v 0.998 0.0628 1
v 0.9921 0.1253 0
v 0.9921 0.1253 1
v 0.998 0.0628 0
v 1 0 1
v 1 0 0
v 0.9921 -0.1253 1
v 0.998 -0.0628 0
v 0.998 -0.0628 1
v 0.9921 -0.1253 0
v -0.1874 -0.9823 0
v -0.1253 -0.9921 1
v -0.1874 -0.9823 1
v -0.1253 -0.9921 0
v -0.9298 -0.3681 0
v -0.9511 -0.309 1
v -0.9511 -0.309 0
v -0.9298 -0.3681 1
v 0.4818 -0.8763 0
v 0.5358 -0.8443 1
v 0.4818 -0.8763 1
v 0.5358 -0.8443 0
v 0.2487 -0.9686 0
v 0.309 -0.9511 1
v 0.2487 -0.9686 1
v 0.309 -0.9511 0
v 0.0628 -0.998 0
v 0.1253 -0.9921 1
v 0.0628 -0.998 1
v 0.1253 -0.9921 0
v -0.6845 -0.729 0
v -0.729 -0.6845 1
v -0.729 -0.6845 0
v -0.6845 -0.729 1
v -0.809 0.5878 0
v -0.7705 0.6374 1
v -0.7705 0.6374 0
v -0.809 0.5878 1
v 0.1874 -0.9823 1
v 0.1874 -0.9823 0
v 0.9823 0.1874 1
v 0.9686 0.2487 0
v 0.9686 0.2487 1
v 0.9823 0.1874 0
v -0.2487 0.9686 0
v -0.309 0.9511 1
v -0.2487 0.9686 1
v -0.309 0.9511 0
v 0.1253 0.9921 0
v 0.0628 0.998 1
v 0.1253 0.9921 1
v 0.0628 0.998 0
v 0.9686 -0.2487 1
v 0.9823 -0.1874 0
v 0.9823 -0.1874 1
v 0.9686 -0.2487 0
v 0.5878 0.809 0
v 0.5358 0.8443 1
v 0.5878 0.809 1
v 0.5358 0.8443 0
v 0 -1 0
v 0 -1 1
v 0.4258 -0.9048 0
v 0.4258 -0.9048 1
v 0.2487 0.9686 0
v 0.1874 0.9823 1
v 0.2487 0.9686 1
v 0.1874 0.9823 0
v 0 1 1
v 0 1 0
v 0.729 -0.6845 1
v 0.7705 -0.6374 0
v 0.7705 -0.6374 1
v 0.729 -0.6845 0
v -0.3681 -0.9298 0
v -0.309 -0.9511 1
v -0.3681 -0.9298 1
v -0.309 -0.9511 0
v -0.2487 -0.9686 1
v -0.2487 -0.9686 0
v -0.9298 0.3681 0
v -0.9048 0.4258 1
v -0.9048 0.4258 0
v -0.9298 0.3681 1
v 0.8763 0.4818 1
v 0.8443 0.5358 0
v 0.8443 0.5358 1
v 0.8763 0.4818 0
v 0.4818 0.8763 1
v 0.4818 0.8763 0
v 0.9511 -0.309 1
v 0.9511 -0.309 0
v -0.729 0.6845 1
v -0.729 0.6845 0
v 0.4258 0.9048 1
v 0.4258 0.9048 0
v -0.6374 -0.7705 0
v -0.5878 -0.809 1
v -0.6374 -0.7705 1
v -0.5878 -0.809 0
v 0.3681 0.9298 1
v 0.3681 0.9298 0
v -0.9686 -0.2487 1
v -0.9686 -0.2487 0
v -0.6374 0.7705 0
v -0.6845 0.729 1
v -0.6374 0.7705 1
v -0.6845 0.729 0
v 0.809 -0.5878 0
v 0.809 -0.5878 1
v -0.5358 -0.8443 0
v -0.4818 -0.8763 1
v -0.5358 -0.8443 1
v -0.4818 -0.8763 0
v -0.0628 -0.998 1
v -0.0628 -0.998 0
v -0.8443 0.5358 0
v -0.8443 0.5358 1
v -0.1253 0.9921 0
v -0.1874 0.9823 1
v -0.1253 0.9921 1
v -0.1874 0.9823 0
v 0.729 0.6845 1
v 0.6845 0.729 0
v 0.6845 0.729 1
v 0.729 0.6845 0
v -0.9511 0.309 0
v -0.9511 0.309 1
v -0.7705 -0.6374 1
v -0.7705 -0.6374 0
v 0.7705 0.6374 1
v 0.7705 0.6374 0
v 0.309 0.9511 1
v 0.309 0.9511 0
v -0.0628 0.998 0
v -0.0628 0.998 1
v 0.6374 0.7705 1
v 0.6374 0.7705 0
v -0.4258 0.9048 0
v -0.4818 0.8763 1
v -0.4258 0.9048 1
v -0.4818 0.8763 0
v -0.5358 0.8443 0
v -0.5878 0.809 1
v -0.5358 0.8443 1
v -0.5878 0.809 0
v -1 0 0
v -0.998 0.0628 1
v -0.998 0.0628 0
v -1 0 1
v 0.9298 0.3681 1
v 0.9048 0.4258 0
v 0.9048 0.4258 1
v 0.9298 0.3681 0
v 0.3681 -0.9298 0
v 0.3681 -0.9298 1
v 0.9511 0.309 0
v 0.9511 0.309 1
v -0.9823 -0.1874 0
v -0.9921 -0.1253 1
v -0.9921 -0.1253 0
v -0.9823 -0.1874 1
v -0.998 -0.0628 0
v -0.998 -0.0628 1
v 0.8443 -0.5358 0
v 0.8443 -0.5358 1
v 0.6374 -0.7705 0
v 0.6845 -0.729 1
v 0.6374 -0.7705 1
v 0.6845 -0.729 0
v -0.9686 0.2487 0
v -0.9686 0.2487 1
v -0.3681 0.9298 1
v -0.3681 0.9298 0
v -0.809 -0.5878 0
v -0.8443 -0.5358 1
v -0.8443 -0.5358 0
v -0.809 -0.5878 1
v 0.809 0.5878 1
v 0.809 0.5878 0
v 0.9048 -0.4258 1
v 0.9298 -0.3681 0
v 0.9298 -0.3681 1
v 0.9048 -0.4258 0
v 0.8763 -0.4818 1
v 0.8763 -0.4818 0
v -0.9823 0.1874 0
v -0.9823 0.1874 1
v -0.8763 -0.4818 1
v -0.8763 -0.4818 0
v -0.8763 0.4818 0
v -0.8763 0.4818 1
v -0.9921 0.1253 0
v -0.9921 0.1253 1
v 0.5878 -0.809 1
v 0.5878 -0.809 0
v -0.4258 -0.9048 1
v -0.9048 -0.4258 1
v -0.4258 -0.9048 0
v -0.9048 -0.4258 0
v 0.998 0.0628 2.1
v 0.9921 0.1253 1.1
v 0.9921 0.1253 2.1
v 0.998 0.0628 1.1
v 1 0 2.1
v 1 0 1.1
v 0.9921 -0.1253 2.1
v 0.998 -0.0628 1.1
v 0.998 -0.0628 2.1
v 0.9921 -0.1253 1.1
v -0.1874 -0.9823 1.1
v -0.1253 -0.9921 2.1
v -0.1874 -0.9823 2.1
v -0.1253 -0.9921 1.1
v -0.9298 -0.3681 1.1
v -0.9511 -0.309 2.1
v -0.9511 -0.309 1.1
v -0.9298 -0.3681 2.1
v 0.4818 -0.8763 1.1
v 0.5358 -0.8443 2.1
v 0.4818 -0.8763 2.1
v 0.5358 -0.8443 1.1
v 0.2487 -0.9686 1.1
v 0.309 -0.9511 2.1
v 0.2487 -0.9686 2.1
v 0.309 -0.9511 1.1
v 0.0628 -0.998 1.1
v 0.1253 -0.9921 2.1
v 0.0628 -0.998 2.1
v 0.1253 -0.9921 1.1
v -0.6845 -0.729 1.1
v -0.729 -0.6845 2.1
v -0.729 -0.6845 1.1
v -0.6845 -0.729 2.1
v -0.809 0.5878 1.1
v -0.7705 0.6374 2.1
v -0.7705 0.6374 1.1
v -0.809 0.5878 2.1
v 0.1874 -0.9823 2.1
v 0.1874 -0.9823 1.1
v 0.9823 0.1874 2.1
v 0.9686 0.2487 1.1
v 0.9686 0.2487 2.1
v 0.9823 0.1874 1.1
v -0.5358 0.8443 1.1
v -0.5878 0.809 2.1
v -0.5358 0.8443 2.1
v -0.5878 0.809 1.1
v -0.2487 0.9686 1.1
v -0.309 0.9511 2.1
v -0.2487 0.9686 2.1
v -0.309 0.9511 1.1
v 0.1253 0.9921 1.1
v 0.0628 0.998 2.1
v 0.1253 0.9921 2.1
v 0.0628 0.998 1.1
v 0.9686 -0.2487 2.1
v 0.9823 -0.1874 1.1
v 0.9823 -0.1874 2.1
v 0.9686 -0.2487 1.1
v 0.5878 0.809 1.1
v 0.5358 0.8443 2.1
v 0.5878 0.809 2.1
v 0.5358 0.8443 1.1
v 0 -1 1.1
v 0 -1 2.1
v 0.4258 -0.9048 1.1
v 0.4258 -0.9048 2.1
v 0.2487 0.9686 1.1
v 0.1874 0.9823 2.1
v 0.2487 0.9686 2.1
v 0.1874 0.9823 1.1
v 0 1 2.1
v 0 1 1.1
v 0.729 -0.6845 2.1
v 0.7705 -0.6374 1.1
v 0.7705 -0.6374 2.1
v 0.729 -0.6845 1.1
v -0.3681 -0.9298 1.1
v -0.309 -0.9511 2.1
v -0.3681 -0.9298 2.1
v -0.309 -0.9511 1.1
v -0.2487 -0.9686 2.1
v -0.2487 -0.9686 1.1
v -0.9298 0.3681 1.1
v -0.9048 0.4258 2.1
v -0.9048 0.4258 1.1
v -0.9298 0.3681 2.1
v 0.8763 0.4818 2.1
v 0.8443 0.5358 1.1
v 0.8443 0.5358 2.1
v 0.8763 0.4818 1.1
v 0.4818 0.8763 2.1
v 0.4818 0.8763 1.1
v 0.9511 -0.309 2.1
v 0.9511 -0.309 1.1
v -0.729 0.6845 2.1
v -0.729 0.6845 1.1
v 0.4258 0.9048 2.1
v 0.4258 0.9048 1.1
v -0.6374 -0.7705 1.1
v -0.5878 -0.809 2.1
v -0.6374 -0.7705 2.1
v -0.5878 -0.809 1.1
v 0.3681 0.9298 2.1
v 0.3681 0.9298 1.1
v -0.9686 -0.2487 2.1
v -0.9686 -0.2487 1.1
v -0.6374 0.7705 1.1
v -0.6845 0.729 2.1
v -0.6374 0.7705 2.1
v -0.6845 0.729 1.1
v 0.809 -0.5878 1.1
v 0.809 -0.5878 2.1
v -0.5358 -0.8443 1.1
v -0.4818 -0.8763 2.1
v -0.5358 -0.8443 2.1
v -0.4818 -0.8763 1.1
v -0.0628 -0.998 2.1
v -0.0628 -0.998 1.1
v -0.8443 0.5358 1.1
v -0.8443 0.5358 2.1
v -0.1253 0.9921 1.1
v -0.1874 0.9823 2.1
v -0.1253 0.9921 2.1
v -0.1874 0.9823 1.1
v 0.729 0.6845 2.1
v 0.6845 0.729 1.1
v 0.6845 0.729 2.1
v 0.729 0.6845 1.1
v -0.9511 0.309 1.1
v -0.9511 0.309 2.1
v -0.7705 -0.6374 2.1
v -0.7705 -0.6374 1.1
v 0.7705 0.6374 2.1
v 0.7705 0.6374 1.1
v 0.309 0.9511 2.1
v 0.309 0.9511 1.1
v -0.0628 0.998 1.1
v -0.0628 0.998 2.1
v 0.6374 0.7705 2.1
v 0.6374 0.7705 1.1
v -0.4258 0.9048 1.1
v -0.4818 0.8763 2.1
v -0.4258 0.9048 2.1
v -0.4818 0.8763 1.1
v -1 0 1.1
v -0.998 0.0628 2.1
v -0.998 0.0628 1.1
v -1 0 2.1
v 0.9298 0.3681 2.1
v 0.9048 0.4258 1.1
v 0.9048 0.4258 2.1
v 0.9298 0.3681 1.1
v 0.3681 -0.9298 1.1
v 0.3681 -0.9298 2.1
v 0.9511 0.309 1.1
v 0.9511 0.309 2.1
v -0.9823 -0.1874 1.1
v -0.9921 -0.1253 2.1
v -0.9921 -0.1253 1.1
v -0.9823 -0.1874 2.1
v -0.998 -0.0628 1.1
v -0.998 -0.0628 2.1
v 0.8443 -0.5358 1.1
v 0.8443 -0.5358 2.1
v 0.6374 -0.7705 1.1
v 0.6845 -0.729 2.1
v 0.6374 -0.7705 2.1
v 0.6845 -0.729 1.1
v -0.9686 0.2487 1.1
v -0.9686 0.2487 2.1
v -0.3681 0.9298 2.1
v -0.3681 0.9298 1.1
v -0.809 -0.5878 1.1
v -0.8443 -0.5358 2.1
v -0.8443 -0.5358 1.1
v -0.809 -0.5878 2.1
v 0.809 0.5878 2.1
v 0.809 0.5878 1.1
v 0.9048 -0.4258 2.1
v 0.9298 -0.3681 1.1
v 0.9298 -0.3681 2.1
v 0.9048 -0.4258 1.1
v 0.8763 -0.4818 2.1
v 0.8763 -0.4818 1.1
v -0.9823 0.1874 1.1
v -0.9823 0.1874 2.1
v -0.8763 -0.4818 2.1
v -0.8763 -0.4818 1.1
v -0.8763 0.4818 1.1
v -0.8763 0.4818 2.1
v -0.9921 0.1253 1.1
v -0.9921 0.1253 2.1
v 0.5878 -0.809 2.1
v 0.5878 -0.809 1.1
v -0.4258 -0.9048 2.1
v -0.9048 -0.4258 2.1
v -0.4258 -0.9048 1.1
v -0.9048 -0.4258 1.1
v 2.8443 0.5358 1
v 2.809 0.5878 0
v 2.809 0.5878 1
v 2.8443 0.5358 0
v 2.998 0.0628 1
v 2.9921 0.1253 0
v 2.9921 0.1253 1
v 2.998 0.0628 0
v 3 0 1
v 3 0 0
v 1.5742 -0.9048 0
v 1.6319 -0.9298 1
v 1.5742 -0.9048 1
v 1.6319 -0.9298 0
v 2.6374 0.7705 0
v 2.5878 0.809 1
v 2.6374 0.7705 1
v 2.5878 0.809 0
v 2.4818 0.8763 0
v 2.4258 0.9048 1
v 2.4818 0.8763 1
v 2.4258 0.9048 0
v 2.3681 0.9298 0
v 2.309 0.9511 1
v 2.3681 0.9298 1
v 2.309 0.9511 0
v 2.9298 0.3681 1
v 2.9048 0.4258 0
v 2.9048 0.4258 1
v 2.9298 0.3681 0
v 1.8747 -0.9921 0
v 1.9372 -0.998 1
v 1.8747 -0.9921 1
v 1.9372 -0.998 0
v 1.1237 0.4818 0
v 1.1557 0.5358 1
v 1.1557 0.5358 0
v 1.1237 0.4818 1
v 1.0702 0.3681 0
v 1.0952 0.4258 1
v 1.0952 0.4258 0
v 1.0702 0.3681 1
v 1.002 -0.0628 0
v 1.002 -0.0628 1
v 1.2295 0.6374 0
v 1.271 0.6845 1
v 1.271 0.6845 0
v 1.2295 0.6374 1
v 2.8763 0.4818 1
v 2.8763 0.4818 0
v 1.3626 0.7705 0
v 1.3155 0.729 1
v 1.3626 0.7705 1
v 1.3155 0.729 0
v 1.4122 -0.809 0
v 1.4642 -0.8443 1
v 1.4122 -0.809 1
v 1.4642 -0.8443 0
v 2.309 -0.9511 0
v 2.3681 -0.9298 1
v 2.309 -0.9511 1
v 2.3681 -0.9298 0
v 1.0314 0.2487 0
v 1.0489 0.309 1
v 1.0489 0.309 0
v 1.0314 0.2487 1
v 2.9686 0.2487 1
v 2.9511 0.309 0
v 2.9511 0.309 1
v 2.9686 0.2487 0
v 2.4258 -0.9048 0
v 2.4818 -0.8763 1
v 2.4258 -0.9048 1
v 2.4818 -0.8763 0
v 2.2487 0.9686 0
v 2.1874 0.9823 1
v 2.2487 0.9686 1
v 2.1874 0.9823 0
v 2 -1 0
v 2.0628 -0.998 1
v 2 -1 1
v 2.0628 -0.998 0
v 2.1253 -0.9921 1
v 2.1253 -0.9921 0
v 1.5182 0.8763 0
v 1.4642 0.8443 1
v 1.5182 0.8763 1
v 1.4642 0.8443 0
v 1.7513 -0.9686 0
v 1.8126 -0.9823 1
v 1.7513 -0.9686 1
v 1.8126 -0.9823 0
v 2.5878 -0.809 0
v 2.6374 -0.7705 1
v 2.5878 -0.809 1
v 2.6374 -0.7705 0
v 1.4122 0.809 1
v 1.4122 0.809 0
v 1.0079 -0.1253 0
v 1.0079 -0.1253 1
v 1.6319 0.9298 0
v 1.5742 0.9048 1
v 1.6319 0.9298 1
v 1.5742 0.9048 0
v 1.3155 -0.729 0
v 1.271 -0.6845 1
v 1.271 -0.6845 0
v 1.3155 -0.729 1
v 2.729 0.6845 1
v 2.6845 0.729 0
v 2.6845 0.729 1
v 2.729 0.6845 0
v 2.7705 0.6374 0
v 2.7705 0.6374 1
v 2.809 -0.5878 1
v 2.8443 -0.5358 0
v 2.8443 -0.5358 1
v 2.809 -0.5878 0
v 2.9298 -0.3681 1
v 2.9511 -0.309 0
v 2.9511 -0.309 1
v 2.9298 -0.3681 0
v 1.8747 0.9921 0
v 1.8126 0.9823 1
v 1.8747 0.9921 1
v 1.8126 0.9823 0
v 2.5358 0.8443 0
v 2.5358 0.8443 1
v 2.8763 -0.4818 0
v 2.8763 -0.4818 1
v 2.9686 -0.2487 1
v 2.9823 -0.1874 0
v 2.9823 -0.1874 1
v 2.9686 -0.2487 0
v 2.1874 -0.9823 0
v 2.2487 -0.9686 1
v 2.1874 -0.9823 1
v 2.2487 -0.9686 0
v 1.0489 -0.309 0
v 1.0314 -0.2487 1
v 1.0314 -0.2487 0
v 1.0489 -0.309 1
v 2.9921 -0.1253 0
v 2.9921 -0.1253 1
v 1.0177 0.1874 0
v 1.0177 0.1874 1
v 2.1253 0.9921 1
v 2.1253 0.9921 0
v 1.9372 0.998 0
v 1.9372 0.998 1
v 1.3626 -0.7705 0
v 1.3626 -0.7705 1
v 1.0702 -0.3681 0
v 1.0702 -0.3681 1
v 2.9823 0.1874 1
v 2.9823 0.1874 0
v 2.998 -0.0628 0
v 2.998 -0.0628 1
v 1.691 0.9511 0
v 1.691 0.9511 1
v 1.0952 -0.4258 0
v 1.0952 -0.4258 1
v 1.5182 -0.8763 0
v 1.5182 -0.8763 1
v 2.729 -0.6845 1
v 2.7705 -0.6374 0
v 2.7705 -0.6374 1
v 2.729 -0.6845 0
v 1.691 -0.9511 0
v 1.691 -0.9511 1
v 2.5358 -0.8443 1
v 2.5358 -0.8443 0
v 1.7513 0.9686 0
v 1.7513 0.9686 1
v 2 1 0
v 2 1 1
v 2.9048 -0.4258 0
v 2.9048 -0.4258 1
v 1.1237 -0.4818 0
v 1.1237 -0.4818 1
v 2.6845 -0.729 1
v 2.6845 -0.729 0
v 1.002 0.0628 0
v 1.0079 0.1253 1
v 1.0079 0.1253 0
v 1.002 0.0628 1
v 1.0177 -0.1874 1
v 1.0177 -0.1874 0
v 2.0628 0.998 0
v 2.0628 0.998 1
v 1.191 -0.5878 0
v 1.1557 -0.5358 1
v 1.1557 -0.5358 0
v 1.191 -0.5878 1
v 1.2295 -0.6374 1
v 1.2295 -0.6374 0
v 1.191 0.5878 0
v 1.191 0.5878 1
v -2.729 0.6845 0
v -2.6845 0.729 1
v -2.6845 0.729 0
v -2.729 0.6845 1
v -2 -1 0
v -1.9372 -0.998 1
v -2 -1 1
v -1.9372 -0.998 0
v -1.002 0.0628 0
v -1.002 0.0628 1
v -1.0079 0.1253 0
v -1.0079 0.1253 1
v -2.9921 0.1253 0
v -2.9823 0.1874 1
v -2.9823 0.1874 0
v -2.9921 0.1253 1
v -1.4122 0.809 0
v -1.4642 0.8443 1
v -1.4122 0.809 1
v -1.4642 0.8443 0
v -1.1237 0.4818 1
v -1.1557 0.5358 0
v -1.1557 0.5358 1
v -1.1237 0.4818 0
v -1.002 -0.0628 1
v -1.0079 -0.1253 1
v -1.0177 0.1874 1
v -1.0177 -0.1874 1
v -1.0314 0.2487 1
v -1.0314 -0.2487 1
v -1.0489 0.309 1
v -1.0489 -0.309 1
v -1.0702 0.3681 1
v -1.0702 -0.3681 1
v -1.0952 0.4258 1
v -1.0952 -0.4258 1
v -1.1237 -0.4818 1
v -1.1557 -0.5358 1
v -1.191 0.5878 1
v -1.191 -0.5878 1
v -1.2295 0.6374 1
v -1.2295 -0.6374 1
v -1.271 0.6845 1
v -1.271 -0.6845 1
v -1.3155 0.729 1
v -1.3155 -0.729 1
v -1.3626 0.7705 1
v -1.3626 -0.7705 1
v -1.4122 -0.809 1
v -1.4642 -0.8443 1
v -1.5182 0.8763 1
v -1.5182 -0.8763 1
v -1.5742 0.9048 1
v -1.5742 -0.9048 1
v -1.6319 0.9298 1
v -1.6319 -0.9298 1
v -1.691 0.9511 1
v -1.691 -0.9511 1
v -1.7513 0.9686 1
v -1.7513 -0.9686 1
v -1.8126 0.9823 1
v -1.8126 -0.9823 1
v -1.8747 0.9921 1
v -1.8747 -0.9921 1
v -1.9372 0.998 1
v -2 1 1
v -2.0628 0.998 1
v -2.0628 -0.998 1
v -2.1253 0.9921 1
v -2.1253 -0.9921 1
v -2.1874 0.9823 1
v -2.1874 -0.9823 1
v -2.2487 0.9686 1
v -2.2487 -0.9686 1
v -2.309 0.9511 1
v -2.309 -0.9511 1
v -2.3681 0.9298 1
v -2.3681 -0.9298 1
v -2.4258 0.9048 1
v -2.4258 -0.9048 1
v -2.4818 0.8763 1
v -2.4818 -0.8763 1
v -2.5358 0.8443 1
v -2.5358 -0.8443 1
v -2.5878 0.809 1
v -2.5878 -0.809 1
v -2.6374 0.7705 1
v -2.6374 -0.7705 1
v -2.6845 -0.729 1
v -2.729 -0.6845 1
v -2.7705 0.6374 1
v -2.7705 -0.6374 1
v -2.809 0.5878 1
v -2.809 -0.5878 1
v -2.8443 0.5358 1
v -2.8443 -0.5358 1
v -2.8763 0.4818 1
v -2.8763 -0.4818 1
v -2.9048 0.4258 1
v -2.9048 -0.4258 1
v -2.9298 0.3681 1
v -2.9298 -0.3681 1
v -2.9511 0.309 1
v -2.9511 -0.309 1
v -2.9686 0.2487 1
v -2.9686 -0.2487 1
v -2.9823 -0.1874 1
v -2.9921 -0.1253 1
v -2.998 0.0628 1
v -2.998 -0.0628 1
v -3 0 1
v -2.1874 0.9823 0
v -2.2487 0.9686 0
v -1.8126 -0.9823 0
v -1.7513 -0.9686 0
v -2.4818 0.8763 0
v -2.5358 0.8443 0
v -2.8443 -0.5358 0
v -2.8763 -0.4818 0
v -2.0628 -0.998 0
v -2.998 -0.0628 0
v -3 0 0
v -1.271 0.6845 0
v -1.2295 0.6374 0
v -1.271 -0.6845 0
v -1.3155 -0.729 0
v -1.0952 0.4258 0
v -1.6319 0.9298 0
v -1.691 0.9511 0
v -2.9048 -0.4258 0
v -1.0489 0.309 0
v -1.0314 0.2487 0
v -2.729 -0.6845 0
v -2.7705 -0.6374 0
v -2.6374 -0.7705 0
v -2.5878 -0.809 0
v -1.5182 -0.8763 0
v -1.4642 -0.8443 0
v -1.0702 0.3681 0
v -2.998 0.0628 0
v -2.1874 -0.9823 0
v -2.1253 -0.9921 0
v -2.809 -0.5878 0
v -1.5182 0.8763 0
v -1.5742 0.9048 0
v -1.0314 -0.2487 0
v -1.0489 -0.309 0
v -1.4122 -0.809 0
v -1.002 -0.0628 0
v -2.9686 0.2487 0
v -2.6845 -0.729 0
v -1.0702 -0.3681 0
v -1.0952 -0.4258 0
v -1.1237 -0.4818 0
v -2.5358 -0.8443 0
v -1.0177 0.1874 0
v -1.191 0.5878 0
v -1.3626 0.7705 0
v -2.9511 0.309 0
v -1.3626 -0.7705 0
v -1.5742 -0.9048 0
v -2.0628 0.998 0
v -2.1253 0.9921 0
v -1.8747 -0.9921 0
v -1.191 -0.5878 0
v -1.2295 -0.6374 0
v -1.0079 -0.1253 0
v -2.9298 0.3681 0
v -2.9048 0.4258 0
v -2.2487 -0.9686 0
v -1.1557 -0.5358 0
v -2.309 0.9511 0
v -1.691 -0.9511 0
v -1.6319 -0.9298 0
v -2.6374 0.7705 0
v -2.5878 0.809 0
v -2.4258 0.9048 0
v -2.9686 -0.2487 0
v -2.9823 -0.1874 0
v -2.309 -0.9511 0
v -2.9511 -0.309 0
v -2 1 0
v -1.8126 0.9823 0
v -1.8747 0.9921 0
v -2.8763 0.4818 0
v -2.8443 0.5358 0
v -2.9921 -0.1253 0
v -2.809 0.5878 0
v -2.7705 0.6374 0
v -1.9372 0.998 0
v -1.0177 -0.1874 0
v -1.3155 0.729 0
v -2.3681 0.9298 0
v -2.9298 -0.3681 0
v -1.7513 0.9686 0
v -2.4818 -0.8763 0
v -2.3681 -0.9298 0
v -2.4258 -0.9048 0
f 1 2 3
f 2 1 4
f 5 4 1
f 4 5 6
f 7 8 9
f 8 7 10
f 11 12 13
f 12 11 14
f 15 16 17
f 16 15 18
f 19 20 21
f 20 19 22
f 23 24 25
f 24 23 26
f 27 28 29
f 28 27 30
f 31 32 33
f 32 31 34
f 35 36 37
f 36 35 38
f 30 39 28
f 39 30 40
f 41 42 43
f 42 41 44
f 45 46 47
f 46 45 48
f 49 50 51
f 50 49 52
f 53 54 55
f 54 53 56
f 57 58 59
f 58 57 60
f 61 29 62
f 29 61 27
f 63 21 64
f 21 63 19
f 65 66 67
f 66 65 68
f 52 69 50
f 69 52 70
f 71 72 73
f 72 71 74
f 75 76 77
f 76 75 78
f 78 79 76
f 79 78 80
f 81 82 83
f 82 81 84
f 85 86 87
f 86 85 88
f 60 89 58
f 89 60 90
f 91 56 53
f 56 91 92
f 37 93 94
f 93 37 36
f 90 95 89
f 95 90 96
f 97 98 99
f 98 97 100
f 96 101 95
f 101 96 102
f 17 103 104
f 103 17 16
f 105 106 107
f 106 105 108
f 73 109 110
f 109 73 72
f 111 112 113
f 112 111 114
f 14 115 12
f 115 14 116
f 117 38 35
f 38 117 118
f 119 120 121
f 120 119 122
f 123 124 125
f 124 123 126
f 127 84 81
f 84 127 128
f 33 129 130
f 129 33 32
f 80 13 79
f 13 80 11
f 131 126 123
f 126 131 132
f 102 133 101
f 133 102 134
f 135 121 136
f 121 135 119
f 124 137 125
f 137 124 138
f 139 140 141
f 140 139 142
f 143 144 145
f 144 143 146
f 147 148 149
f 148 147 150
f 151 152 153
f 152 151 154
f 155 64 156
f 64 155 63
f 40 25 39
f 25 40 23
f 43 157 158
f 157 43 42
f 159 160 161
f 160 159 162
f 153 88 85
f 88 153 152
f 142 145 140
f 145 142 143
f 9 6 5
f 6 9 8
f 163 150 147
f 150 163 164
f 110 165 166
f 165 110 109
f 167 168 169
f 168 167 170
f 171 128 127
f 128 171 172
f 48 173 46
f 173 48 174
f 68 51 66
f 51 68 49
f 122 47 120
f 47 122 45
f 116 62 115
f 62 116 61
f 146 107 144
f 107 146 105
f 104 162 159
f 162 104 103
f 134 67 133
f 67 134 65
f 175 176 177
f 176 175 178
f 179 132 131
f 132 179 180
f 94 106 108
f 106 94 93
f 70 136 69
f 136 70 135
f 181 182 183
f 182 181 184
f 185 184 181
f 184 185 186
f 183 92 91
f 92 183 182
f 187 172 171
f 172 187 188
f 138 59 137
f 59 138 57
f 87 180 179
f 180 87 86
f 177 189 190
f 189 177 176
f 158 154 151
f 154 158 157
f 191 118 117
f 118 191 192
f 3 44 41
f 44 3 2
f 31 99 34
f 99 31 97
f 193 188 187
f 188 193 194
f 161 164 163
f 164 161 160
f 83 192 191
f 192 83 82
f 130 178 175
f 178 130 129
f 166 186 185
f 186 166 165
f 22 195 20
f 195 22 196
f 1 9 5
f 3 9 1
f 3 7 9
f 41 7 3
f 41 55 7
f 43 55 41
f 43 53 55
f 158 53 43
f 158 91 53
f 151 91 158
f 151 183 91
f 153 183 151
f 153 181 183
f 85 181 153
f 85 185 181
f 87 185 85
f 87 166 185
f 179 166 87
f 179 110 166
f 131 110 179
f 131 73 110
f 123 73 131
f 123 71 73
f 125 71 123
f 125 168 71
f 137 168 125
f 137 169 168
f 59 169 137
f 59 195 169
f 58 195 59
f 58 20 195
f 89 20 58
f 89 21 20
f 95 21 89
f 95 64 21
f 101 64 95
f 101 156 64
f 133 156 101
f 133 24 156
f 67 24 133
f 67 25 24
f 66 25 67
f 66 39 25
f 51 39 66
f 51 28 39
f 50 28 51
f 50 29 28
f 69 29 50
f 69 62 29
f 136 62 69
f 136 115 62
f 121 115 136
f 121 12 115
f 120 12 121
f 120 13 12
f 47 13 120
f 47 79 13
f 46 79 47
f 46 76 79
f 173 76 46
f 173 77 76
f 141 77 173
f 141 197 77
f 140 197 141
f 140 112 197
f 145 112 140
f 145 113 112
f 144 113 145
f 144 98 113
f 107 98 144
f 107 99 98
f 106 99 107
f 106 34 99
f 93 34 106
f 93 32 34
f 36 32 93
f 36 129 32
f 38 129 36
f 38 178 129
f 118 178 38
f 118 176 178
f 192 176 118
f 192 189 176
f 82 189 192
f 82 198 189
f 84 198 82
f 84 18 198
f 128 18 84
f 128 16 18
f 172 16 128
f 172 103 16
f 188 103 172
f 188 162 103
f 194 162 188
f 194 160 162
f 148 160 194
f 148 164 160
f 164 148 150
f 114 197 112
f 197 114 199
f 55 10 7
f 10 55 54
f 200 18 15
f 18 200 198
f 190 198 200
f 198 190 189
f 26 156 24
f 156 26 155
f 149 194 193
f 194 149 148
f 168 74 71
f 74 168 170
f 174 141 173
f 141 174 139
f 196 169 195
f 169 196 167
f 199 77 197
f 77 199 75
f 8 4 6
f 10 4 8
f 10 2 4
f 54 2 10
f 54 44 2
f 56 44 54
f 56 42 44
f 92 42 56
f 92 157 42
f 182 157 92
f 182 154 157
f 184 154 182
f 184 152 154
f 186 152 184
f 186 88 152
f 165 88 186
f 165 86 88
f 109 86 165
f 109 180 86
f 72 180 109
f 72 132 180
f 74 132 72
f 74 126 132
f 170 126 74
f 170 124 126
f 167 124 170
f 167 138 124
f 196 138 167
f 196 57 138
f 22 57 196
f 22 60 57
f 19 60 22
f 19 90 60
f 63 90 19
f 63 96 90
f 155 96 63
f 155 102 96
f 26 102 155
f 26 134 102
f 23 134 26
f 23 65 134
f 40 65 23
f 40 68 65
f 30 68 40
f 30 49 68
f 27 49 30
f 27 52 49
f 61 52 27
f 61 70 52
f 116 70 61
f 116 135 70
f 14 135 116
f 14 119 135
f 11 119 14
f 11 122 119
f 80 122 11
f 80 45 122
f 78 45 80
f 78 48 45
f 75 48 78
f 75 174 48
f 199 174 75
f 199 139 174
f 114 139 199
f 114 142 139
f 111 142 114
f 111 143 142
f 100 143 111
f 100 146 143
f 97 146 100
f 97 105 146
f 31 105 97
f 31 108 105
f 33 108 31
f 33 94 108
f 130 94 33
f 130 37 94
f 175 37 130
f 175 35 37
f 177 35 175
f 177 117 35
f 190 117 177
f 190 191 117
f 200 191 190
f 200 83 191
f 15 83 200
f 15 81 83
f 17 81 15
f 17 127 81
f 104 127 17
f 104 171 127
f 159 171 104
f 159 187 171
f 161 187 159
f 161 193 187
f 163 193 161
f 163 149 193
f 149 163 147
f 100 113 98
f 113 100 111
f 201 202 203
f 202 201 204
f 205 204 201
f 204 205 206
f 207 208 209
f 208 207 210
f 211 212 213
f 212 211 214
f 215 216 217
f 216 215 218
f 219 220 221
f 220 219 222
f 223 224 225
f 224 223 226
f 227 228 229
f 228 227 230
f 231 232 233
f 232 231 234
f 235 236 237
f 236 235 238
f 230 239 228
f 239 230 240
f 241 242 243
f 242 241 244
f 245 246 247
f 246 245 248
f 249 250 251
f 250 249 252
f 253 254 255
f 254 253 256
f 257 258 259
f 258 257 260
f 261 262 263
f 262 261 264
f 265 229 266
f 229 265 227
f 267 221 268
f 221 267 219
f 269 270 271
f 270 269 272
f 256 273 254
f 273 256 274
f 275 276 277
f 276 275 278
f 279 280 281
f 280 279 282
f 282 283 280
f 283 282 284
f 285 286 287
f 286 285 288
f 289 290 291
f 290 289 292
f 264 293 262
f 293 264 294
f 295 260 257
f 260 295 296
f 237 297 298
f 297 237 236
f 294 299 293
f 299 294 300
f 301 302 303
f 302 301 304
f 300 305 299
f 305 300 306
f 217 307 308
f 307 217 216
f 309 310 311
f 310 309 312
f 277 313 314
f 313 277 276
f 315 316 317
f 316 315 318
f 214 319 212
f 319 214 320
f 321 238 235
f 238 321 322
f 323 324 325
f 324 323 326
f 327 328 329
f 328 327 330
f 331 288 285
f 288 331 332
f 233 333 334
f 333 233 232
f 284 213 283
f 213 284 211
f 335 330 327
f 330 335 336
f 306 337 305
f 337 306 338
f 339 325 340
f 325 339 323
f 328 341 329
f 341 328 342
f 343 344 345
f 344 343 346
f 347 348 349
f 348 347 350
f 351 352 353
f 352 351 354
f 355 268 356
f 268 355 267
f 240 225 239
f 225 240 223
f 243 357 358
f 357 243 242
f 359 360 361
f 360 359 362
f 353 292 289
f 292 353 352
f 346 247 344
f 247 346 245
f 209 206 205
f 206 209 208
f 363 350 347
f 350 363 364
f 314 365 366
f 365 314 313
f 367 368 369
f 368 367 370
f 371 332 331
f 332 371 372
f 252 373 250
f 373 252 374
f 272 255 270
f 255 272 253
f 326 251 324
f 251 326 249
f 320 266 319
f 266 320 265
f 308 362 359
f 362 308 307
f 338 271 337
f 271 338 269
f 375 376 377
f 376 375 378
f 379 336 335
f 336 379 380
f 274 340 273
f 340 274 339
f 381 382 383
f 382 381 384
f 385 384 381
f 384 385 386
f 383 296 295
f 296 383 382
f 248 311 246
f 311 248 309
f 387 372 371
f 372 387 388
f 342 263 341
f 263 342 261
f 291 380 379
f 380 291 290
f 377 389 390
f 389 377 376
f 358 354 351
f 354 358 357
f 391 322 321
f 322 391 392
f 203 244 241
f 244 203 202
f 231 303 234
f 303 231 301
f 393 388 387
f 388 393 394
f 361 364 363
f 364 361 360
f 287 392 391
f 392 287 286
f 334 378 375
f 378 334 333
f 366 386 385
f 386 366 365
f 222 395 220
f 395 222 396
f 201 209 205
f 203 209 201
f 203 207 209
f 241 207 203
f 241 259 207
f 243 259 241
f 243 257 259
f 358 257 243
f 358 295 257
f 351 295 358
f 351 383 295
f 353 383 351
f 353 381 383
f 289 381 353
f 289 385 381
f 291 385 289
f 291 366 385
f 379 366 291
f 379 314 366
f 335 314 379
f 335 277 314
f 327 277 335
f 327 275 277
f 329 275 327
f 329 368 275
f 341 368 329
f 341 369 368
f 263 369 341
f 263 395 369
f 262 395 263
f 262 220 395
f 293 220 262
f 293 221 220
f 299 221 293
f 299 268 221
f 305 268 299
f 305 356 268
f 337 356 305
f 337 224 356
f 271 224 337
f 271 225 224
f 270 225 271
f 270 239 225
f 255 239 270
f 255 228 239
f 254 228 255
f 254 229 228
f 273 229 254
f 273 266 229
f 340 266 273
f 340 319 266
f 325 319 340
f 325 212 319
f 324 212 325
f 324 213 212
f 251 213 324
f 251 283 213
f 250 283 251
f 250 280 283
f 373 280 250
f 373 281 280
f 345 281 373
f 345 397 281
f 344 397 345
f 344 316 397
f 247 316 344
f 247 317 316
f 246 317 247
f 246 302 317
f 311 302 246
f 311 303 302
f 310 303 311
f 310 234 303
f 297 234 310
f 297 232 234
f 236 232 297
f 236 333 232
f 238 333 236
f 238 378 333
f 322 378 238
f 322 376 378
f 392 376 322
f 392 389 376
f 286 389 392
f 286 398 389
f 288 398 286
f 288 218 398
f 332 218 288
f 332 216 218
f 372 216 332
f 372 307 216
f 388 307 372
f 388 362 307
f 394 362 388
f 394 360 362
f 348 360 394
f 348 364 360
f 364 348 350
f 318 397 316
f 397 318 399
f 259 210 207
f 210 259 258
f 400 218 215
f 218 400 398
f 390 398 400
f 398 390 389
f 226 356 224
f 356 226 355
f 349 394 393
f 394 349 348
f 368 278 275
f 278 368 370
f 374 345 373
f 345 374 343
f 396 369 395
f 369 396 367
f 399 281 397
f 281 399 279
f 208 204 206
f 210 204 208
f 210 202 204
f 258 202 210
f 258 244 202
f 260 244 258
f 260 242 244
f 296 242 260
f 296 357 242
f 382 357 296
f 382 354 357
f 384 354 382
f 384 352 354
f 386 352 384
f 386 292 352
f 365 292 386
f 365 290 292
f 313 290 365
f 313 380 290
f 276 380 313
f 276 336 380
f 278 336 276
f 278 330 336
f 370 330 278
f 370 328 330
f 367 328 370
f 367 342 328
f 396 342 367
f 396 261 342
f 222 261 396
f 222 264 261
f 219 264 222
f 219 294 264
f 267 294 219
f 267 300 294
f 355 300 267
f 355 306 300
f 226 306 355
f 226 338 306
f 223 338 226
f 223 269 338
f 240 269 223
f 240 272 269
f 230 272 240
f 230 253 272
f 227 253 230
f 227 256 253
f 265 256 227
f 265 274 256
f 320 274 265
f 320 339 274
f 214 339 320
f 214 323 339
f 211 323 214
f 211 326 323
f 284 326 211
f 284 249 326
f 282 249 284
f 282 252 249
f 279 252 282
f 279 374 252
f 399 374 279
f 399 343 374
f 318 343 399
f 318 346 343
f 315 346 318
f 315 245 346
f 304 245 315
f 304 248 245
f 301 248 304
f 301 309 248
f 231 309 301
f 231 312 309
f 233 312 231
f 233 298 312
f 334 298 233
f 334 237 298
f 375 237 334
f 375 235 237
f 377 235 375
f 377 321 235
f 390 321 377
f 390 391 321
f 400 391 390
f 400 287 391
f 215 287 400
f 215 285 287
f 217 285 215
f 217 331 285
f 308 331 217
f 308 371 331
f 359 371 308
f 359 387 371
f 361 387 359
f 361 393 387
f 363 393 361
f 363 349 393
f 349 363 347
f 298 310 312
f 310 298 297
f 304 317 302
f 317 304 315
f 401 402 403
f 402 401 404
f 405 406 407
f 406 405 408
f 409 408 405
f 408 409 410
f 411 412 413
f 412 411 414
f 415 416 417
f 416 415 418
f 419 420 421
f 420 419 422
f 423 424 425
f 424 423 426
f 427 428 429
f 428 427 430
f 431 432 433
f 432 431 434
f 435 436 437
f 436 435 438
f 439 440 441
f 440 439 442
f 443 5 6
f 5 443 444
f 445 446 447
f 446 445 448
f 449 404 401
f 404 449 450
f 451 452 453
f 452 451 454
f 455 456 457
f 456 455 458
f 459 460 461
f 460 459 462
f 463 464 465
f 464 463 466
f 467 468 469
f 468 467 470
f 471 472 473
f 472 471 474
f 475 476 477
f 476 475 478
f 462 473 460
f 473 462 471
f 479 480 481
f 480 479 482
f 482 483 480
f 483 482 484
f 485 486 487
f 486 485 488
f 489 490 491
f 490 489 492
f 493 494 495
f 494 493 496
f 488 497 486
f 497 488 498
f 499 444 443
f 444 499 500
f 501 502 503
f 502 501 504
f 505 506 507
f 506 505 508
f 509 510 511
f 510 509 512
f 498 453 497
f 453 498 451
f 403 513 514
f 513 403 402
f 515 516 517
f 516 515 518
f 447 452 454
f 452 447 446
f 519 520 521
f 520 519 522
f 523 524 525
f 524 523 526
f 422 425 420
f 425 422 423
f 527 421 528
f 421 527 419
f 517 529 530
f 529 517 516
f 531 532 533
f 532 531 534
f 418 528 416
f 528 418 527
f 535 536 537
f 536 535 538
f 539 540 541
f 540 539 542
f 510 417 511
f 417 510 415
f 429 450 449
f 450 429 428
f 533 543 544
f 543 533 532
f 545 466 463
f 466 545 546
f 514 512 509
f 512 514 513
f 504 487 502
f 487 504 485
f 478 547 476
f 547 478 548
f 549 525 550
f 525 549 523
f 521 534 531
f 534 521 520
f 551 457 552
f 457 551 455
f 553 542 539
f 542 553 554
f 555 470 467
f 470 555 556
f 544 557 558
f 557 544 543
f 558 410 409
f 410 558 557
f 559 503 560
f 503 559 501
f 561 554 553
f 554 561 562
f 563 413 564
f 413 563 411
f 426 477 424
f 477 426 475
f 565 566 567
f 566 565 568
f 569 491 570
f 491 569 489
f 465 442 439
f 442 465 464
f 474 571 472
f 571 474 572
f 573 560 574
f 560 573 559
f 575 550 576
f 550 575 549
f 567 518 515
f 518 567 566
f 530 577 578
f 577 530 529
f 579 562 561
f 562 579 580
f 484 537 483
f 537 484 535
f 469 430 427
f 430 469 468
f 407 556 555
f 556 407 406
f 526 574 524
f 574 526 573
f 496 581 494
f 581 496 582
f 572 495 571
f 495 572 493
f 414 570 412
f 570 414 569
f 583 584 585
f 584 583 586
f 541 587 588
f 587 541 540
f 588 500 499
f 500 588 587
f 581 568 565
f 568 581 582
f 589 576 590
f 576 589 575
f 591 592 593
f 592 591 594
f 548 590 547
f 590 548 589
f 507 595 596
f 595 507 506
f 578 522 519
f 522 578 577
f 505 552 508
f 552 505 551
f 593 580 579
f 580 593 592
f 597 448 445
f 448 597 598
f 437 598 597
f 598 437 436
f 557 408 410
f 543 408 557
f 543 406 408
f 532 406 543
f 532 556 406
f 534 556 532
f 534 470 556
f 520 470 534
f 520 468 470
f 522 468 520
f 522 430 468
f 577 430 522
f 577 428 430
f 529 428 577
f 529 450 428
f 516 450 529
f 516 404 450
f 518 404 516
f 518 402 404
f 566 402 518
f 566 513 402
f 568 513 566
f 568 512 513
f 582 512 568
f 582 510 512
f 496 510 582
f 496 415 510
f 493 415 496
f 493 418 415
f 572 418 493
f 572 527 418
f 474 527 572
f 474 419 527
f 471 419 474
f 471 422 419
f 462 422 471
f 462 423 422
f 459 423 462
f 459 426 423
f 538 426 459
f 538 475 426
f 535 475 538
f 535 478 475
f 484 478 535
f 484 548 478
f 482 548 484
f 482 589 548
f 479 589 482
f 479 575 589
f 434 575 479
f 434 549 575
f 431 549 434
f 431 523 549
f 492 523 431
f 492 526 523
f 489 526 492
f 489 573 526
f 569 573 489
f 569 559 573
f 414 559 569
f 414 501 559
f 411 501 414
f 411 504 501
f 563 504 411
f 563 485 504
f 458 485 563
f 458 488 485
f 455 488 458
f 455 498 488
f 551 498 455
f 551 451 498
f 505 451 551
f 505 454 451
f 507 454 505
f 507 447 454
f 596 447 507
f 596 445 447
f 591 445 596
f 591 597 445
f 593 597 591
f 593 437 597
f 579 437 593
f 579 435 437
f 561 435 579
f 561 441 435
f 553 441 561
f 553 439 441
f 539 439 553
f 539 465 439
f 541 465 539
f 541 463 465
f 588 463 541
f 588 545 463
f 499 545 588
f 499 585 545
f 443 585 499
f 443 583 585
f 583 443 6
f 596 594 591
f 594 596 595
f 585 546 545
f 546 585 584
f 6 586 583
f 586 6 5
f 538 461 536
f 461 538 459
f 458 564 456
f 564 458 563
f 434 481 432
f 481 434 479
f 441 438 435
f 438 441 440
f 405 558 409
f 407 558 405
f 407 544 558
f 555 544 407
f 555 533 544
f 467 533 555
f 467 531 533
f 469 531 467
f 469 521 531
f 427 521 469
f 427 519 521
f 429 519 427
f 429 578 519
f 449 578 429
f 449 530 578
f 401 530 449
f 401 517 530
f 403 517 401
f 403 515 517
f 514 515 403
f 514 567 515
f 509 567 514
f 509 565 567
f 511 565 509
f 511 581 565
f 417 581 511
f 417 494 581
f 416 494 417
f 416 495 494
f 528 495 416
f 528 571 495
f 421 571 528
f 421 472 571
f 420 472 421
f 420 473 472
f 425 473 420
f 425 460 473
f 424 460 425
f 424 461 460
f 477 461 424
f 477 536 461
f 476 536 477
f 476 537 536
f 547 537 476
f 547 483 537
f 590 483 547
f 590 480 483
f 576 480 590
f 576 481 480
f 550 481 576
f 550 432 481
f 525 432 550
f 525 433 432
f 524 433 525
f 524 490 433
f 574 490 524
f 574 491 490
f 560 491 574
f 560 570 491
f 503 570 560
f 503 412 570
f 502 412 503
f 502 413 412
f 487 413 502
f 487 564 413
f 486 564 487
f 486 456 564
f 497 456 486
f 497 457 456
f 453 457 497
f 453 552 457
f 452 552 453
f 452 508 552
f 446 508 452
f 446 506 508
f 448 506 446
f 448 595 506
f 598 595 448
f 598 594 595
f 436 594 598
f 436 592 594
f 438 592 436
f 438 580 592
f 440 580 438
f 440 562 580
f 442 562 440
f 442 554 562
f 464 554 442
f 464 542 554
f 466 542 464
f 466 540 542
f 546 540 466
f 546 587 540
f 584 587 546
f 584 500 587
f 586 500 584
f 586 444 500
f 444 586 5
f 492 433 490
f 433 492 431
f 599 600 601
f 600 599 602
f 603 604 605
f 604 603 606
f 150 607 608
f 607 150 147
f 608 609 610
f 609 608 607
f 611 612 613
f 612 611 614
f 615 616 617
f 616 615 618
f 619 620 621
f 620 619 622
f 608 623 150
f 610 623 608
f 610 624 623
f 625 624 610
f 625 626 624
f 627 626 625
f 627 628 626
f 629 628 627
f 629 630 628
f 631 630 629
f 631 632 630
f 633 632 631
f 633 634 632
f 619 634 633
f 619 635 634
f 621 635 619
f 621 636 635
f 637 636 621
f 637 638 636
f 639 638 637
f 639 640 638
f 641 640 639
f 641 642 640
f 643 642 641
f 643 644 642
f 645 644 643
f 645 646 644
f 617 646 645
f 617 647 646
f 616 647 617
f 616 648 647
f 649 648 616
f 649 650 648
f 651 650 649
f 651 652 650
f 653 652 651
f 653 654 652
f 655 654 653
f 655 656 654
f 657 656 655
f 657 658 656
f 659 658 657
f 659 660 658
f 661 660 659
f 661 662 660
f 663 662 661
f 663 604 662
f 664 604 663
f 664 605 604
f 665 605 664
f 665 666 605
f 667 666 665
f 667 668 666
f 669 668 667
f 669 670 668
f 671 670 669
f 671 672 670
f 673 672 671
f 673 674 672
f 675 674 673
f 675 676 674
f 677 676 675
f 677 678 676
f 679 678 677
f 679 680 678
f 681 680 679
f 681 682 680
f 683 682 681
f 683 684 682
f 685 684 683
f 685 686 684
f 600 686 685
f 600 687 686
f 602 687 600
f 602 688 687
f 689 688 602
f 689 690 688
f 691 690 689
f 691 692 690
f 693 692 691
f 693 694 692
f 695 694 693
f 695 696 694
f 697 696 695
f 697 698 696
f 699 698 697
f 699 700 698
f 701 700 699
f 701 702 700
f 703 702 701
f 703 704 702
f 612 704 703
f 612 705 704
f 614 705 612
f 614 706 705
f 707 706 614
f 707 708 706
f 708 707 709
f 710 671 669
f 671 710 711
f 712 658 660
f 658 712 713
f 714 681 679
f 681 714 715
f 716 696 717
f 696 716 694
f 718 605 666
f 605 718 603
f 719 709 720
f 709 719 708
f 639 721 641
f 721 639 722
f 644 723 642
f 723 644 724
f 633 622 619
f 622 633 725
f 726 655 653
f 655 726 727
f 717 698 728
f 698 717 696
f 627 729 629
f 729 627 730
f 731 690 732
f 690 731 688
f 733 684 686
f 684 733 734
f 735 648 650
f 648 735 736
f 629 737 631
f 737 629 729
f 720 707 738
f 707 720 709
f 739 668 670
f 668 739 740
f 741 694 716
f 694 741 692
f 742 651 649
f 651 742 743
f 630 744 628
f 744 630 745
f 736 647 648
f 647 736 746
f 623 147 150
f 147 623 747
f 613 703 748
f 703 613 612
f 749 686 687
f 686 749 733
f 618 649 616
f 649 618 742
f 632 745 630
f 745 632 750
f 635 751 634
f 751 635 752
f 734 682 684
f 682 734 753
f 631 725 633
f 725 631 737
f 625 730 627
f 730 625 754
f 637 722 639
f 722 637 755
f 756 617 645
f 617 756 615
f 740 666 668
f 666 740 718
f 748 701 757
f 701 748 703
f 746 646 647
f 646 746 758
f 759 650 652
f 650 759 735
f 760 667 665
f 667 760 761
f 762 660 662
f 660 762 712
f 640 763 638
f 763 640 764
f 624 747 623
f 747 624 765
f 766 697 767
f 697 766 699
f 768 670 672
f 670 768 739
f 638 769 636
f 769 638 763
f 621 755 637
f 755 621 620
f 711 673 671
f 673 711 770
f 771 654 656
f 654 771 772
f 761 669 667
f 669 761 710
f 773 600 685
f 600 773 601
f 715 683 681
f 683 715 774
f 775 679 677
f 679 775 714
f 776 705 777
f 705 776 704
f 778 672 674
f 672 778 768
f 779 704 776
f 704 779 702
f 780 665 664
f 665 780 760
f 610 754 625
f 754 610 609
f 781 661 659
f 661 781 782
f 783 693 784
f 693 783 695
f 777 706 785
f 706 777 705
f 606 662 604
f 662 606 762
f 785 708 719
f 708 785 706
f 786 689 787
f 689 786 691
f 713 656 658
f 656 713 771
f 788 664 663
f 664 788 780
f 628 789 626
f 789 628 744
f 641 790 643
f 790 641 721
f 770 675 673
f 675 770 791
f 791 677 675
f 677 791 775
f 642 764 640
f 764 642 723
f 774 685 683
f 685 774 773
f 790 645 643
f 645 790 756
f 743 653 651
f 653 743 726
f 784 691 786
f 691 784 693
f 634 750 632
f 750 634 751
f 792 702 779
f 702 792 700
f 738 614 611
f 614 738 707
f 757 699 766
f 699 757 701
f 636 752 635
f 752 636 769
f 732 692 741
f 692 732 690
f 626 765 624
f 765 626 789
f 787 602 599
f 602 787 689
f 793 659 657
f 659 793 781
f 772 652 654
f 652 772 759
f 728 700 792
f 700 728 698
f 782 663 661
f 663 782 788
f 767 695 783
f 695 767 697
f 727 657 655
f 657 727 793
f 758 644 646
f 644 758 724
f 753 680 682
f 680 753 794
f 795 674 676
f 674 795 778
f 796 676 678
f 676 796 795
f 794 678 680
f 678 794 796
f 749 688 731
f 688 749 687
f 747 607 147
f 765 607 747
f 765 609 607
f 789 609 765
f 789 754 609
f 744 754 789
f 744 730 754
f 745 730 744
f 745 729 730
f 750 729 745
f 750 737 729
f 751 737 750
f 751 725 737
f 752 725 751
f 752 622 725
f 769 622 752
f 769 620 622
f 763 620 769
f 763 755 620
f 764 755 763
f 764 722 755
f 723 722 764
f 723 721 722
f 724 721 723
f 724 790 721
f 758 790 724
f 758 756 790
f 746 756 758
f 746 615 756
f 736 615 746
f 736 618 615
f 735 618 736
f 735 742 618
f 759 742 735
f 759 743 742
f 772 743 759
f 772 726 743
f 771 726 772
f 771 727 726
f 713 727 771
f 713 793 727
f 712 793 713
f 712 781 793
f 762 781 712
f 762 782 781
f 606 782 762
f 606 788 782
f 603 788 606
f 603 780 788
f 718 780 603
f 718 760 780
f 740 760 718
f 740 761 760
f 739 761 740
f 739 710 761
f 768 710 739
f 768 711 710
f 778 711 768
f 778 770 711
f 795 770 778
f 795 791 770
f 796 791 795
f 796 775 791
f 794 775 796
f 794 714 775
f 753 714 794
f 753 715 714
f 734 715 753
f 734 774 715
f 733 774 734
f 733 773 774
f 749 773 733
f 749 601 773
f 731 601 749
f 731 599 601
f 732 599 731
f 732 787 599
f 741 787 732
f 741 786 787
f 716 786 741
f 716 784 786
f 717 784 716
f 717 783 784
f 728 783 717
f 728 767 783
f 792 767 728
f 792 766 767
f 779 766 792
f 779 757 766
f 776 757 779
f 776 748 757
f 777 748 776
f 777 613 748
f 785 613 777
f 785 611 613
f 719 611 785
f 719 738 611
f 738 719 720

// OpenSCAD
/* 
	Supplemental Valve 3

*/

$fn = 100; // increase the smoothness of the cylinders

// Define the dimensions
chamber_diameter = 2; // Diameter of both chambers
membrane_thickness = 0.1; // 100 microns
chamber_height = 1; // Height of each chamber
port_diameter = 2; // Diameter of the ports
port_height = 2; // Height of the ports

// Draw the fluid chamber
cylinder(h=chamber_height, d=chamber_diameter);

// Draw the pneumatic chamber with membrane
translate([0, 0, chamber_height + membrane_thickness])
    cylinder(h=chamber_height, d=chamber_diameter);

// Draw the two offset ports
translate([port_height, 0, 0])
    cylinder(h=chamber_height, d=port_diameter);

translate([-port_height, 0, 0])
    cylinder(h=chamber_height, d=port_diameter);
